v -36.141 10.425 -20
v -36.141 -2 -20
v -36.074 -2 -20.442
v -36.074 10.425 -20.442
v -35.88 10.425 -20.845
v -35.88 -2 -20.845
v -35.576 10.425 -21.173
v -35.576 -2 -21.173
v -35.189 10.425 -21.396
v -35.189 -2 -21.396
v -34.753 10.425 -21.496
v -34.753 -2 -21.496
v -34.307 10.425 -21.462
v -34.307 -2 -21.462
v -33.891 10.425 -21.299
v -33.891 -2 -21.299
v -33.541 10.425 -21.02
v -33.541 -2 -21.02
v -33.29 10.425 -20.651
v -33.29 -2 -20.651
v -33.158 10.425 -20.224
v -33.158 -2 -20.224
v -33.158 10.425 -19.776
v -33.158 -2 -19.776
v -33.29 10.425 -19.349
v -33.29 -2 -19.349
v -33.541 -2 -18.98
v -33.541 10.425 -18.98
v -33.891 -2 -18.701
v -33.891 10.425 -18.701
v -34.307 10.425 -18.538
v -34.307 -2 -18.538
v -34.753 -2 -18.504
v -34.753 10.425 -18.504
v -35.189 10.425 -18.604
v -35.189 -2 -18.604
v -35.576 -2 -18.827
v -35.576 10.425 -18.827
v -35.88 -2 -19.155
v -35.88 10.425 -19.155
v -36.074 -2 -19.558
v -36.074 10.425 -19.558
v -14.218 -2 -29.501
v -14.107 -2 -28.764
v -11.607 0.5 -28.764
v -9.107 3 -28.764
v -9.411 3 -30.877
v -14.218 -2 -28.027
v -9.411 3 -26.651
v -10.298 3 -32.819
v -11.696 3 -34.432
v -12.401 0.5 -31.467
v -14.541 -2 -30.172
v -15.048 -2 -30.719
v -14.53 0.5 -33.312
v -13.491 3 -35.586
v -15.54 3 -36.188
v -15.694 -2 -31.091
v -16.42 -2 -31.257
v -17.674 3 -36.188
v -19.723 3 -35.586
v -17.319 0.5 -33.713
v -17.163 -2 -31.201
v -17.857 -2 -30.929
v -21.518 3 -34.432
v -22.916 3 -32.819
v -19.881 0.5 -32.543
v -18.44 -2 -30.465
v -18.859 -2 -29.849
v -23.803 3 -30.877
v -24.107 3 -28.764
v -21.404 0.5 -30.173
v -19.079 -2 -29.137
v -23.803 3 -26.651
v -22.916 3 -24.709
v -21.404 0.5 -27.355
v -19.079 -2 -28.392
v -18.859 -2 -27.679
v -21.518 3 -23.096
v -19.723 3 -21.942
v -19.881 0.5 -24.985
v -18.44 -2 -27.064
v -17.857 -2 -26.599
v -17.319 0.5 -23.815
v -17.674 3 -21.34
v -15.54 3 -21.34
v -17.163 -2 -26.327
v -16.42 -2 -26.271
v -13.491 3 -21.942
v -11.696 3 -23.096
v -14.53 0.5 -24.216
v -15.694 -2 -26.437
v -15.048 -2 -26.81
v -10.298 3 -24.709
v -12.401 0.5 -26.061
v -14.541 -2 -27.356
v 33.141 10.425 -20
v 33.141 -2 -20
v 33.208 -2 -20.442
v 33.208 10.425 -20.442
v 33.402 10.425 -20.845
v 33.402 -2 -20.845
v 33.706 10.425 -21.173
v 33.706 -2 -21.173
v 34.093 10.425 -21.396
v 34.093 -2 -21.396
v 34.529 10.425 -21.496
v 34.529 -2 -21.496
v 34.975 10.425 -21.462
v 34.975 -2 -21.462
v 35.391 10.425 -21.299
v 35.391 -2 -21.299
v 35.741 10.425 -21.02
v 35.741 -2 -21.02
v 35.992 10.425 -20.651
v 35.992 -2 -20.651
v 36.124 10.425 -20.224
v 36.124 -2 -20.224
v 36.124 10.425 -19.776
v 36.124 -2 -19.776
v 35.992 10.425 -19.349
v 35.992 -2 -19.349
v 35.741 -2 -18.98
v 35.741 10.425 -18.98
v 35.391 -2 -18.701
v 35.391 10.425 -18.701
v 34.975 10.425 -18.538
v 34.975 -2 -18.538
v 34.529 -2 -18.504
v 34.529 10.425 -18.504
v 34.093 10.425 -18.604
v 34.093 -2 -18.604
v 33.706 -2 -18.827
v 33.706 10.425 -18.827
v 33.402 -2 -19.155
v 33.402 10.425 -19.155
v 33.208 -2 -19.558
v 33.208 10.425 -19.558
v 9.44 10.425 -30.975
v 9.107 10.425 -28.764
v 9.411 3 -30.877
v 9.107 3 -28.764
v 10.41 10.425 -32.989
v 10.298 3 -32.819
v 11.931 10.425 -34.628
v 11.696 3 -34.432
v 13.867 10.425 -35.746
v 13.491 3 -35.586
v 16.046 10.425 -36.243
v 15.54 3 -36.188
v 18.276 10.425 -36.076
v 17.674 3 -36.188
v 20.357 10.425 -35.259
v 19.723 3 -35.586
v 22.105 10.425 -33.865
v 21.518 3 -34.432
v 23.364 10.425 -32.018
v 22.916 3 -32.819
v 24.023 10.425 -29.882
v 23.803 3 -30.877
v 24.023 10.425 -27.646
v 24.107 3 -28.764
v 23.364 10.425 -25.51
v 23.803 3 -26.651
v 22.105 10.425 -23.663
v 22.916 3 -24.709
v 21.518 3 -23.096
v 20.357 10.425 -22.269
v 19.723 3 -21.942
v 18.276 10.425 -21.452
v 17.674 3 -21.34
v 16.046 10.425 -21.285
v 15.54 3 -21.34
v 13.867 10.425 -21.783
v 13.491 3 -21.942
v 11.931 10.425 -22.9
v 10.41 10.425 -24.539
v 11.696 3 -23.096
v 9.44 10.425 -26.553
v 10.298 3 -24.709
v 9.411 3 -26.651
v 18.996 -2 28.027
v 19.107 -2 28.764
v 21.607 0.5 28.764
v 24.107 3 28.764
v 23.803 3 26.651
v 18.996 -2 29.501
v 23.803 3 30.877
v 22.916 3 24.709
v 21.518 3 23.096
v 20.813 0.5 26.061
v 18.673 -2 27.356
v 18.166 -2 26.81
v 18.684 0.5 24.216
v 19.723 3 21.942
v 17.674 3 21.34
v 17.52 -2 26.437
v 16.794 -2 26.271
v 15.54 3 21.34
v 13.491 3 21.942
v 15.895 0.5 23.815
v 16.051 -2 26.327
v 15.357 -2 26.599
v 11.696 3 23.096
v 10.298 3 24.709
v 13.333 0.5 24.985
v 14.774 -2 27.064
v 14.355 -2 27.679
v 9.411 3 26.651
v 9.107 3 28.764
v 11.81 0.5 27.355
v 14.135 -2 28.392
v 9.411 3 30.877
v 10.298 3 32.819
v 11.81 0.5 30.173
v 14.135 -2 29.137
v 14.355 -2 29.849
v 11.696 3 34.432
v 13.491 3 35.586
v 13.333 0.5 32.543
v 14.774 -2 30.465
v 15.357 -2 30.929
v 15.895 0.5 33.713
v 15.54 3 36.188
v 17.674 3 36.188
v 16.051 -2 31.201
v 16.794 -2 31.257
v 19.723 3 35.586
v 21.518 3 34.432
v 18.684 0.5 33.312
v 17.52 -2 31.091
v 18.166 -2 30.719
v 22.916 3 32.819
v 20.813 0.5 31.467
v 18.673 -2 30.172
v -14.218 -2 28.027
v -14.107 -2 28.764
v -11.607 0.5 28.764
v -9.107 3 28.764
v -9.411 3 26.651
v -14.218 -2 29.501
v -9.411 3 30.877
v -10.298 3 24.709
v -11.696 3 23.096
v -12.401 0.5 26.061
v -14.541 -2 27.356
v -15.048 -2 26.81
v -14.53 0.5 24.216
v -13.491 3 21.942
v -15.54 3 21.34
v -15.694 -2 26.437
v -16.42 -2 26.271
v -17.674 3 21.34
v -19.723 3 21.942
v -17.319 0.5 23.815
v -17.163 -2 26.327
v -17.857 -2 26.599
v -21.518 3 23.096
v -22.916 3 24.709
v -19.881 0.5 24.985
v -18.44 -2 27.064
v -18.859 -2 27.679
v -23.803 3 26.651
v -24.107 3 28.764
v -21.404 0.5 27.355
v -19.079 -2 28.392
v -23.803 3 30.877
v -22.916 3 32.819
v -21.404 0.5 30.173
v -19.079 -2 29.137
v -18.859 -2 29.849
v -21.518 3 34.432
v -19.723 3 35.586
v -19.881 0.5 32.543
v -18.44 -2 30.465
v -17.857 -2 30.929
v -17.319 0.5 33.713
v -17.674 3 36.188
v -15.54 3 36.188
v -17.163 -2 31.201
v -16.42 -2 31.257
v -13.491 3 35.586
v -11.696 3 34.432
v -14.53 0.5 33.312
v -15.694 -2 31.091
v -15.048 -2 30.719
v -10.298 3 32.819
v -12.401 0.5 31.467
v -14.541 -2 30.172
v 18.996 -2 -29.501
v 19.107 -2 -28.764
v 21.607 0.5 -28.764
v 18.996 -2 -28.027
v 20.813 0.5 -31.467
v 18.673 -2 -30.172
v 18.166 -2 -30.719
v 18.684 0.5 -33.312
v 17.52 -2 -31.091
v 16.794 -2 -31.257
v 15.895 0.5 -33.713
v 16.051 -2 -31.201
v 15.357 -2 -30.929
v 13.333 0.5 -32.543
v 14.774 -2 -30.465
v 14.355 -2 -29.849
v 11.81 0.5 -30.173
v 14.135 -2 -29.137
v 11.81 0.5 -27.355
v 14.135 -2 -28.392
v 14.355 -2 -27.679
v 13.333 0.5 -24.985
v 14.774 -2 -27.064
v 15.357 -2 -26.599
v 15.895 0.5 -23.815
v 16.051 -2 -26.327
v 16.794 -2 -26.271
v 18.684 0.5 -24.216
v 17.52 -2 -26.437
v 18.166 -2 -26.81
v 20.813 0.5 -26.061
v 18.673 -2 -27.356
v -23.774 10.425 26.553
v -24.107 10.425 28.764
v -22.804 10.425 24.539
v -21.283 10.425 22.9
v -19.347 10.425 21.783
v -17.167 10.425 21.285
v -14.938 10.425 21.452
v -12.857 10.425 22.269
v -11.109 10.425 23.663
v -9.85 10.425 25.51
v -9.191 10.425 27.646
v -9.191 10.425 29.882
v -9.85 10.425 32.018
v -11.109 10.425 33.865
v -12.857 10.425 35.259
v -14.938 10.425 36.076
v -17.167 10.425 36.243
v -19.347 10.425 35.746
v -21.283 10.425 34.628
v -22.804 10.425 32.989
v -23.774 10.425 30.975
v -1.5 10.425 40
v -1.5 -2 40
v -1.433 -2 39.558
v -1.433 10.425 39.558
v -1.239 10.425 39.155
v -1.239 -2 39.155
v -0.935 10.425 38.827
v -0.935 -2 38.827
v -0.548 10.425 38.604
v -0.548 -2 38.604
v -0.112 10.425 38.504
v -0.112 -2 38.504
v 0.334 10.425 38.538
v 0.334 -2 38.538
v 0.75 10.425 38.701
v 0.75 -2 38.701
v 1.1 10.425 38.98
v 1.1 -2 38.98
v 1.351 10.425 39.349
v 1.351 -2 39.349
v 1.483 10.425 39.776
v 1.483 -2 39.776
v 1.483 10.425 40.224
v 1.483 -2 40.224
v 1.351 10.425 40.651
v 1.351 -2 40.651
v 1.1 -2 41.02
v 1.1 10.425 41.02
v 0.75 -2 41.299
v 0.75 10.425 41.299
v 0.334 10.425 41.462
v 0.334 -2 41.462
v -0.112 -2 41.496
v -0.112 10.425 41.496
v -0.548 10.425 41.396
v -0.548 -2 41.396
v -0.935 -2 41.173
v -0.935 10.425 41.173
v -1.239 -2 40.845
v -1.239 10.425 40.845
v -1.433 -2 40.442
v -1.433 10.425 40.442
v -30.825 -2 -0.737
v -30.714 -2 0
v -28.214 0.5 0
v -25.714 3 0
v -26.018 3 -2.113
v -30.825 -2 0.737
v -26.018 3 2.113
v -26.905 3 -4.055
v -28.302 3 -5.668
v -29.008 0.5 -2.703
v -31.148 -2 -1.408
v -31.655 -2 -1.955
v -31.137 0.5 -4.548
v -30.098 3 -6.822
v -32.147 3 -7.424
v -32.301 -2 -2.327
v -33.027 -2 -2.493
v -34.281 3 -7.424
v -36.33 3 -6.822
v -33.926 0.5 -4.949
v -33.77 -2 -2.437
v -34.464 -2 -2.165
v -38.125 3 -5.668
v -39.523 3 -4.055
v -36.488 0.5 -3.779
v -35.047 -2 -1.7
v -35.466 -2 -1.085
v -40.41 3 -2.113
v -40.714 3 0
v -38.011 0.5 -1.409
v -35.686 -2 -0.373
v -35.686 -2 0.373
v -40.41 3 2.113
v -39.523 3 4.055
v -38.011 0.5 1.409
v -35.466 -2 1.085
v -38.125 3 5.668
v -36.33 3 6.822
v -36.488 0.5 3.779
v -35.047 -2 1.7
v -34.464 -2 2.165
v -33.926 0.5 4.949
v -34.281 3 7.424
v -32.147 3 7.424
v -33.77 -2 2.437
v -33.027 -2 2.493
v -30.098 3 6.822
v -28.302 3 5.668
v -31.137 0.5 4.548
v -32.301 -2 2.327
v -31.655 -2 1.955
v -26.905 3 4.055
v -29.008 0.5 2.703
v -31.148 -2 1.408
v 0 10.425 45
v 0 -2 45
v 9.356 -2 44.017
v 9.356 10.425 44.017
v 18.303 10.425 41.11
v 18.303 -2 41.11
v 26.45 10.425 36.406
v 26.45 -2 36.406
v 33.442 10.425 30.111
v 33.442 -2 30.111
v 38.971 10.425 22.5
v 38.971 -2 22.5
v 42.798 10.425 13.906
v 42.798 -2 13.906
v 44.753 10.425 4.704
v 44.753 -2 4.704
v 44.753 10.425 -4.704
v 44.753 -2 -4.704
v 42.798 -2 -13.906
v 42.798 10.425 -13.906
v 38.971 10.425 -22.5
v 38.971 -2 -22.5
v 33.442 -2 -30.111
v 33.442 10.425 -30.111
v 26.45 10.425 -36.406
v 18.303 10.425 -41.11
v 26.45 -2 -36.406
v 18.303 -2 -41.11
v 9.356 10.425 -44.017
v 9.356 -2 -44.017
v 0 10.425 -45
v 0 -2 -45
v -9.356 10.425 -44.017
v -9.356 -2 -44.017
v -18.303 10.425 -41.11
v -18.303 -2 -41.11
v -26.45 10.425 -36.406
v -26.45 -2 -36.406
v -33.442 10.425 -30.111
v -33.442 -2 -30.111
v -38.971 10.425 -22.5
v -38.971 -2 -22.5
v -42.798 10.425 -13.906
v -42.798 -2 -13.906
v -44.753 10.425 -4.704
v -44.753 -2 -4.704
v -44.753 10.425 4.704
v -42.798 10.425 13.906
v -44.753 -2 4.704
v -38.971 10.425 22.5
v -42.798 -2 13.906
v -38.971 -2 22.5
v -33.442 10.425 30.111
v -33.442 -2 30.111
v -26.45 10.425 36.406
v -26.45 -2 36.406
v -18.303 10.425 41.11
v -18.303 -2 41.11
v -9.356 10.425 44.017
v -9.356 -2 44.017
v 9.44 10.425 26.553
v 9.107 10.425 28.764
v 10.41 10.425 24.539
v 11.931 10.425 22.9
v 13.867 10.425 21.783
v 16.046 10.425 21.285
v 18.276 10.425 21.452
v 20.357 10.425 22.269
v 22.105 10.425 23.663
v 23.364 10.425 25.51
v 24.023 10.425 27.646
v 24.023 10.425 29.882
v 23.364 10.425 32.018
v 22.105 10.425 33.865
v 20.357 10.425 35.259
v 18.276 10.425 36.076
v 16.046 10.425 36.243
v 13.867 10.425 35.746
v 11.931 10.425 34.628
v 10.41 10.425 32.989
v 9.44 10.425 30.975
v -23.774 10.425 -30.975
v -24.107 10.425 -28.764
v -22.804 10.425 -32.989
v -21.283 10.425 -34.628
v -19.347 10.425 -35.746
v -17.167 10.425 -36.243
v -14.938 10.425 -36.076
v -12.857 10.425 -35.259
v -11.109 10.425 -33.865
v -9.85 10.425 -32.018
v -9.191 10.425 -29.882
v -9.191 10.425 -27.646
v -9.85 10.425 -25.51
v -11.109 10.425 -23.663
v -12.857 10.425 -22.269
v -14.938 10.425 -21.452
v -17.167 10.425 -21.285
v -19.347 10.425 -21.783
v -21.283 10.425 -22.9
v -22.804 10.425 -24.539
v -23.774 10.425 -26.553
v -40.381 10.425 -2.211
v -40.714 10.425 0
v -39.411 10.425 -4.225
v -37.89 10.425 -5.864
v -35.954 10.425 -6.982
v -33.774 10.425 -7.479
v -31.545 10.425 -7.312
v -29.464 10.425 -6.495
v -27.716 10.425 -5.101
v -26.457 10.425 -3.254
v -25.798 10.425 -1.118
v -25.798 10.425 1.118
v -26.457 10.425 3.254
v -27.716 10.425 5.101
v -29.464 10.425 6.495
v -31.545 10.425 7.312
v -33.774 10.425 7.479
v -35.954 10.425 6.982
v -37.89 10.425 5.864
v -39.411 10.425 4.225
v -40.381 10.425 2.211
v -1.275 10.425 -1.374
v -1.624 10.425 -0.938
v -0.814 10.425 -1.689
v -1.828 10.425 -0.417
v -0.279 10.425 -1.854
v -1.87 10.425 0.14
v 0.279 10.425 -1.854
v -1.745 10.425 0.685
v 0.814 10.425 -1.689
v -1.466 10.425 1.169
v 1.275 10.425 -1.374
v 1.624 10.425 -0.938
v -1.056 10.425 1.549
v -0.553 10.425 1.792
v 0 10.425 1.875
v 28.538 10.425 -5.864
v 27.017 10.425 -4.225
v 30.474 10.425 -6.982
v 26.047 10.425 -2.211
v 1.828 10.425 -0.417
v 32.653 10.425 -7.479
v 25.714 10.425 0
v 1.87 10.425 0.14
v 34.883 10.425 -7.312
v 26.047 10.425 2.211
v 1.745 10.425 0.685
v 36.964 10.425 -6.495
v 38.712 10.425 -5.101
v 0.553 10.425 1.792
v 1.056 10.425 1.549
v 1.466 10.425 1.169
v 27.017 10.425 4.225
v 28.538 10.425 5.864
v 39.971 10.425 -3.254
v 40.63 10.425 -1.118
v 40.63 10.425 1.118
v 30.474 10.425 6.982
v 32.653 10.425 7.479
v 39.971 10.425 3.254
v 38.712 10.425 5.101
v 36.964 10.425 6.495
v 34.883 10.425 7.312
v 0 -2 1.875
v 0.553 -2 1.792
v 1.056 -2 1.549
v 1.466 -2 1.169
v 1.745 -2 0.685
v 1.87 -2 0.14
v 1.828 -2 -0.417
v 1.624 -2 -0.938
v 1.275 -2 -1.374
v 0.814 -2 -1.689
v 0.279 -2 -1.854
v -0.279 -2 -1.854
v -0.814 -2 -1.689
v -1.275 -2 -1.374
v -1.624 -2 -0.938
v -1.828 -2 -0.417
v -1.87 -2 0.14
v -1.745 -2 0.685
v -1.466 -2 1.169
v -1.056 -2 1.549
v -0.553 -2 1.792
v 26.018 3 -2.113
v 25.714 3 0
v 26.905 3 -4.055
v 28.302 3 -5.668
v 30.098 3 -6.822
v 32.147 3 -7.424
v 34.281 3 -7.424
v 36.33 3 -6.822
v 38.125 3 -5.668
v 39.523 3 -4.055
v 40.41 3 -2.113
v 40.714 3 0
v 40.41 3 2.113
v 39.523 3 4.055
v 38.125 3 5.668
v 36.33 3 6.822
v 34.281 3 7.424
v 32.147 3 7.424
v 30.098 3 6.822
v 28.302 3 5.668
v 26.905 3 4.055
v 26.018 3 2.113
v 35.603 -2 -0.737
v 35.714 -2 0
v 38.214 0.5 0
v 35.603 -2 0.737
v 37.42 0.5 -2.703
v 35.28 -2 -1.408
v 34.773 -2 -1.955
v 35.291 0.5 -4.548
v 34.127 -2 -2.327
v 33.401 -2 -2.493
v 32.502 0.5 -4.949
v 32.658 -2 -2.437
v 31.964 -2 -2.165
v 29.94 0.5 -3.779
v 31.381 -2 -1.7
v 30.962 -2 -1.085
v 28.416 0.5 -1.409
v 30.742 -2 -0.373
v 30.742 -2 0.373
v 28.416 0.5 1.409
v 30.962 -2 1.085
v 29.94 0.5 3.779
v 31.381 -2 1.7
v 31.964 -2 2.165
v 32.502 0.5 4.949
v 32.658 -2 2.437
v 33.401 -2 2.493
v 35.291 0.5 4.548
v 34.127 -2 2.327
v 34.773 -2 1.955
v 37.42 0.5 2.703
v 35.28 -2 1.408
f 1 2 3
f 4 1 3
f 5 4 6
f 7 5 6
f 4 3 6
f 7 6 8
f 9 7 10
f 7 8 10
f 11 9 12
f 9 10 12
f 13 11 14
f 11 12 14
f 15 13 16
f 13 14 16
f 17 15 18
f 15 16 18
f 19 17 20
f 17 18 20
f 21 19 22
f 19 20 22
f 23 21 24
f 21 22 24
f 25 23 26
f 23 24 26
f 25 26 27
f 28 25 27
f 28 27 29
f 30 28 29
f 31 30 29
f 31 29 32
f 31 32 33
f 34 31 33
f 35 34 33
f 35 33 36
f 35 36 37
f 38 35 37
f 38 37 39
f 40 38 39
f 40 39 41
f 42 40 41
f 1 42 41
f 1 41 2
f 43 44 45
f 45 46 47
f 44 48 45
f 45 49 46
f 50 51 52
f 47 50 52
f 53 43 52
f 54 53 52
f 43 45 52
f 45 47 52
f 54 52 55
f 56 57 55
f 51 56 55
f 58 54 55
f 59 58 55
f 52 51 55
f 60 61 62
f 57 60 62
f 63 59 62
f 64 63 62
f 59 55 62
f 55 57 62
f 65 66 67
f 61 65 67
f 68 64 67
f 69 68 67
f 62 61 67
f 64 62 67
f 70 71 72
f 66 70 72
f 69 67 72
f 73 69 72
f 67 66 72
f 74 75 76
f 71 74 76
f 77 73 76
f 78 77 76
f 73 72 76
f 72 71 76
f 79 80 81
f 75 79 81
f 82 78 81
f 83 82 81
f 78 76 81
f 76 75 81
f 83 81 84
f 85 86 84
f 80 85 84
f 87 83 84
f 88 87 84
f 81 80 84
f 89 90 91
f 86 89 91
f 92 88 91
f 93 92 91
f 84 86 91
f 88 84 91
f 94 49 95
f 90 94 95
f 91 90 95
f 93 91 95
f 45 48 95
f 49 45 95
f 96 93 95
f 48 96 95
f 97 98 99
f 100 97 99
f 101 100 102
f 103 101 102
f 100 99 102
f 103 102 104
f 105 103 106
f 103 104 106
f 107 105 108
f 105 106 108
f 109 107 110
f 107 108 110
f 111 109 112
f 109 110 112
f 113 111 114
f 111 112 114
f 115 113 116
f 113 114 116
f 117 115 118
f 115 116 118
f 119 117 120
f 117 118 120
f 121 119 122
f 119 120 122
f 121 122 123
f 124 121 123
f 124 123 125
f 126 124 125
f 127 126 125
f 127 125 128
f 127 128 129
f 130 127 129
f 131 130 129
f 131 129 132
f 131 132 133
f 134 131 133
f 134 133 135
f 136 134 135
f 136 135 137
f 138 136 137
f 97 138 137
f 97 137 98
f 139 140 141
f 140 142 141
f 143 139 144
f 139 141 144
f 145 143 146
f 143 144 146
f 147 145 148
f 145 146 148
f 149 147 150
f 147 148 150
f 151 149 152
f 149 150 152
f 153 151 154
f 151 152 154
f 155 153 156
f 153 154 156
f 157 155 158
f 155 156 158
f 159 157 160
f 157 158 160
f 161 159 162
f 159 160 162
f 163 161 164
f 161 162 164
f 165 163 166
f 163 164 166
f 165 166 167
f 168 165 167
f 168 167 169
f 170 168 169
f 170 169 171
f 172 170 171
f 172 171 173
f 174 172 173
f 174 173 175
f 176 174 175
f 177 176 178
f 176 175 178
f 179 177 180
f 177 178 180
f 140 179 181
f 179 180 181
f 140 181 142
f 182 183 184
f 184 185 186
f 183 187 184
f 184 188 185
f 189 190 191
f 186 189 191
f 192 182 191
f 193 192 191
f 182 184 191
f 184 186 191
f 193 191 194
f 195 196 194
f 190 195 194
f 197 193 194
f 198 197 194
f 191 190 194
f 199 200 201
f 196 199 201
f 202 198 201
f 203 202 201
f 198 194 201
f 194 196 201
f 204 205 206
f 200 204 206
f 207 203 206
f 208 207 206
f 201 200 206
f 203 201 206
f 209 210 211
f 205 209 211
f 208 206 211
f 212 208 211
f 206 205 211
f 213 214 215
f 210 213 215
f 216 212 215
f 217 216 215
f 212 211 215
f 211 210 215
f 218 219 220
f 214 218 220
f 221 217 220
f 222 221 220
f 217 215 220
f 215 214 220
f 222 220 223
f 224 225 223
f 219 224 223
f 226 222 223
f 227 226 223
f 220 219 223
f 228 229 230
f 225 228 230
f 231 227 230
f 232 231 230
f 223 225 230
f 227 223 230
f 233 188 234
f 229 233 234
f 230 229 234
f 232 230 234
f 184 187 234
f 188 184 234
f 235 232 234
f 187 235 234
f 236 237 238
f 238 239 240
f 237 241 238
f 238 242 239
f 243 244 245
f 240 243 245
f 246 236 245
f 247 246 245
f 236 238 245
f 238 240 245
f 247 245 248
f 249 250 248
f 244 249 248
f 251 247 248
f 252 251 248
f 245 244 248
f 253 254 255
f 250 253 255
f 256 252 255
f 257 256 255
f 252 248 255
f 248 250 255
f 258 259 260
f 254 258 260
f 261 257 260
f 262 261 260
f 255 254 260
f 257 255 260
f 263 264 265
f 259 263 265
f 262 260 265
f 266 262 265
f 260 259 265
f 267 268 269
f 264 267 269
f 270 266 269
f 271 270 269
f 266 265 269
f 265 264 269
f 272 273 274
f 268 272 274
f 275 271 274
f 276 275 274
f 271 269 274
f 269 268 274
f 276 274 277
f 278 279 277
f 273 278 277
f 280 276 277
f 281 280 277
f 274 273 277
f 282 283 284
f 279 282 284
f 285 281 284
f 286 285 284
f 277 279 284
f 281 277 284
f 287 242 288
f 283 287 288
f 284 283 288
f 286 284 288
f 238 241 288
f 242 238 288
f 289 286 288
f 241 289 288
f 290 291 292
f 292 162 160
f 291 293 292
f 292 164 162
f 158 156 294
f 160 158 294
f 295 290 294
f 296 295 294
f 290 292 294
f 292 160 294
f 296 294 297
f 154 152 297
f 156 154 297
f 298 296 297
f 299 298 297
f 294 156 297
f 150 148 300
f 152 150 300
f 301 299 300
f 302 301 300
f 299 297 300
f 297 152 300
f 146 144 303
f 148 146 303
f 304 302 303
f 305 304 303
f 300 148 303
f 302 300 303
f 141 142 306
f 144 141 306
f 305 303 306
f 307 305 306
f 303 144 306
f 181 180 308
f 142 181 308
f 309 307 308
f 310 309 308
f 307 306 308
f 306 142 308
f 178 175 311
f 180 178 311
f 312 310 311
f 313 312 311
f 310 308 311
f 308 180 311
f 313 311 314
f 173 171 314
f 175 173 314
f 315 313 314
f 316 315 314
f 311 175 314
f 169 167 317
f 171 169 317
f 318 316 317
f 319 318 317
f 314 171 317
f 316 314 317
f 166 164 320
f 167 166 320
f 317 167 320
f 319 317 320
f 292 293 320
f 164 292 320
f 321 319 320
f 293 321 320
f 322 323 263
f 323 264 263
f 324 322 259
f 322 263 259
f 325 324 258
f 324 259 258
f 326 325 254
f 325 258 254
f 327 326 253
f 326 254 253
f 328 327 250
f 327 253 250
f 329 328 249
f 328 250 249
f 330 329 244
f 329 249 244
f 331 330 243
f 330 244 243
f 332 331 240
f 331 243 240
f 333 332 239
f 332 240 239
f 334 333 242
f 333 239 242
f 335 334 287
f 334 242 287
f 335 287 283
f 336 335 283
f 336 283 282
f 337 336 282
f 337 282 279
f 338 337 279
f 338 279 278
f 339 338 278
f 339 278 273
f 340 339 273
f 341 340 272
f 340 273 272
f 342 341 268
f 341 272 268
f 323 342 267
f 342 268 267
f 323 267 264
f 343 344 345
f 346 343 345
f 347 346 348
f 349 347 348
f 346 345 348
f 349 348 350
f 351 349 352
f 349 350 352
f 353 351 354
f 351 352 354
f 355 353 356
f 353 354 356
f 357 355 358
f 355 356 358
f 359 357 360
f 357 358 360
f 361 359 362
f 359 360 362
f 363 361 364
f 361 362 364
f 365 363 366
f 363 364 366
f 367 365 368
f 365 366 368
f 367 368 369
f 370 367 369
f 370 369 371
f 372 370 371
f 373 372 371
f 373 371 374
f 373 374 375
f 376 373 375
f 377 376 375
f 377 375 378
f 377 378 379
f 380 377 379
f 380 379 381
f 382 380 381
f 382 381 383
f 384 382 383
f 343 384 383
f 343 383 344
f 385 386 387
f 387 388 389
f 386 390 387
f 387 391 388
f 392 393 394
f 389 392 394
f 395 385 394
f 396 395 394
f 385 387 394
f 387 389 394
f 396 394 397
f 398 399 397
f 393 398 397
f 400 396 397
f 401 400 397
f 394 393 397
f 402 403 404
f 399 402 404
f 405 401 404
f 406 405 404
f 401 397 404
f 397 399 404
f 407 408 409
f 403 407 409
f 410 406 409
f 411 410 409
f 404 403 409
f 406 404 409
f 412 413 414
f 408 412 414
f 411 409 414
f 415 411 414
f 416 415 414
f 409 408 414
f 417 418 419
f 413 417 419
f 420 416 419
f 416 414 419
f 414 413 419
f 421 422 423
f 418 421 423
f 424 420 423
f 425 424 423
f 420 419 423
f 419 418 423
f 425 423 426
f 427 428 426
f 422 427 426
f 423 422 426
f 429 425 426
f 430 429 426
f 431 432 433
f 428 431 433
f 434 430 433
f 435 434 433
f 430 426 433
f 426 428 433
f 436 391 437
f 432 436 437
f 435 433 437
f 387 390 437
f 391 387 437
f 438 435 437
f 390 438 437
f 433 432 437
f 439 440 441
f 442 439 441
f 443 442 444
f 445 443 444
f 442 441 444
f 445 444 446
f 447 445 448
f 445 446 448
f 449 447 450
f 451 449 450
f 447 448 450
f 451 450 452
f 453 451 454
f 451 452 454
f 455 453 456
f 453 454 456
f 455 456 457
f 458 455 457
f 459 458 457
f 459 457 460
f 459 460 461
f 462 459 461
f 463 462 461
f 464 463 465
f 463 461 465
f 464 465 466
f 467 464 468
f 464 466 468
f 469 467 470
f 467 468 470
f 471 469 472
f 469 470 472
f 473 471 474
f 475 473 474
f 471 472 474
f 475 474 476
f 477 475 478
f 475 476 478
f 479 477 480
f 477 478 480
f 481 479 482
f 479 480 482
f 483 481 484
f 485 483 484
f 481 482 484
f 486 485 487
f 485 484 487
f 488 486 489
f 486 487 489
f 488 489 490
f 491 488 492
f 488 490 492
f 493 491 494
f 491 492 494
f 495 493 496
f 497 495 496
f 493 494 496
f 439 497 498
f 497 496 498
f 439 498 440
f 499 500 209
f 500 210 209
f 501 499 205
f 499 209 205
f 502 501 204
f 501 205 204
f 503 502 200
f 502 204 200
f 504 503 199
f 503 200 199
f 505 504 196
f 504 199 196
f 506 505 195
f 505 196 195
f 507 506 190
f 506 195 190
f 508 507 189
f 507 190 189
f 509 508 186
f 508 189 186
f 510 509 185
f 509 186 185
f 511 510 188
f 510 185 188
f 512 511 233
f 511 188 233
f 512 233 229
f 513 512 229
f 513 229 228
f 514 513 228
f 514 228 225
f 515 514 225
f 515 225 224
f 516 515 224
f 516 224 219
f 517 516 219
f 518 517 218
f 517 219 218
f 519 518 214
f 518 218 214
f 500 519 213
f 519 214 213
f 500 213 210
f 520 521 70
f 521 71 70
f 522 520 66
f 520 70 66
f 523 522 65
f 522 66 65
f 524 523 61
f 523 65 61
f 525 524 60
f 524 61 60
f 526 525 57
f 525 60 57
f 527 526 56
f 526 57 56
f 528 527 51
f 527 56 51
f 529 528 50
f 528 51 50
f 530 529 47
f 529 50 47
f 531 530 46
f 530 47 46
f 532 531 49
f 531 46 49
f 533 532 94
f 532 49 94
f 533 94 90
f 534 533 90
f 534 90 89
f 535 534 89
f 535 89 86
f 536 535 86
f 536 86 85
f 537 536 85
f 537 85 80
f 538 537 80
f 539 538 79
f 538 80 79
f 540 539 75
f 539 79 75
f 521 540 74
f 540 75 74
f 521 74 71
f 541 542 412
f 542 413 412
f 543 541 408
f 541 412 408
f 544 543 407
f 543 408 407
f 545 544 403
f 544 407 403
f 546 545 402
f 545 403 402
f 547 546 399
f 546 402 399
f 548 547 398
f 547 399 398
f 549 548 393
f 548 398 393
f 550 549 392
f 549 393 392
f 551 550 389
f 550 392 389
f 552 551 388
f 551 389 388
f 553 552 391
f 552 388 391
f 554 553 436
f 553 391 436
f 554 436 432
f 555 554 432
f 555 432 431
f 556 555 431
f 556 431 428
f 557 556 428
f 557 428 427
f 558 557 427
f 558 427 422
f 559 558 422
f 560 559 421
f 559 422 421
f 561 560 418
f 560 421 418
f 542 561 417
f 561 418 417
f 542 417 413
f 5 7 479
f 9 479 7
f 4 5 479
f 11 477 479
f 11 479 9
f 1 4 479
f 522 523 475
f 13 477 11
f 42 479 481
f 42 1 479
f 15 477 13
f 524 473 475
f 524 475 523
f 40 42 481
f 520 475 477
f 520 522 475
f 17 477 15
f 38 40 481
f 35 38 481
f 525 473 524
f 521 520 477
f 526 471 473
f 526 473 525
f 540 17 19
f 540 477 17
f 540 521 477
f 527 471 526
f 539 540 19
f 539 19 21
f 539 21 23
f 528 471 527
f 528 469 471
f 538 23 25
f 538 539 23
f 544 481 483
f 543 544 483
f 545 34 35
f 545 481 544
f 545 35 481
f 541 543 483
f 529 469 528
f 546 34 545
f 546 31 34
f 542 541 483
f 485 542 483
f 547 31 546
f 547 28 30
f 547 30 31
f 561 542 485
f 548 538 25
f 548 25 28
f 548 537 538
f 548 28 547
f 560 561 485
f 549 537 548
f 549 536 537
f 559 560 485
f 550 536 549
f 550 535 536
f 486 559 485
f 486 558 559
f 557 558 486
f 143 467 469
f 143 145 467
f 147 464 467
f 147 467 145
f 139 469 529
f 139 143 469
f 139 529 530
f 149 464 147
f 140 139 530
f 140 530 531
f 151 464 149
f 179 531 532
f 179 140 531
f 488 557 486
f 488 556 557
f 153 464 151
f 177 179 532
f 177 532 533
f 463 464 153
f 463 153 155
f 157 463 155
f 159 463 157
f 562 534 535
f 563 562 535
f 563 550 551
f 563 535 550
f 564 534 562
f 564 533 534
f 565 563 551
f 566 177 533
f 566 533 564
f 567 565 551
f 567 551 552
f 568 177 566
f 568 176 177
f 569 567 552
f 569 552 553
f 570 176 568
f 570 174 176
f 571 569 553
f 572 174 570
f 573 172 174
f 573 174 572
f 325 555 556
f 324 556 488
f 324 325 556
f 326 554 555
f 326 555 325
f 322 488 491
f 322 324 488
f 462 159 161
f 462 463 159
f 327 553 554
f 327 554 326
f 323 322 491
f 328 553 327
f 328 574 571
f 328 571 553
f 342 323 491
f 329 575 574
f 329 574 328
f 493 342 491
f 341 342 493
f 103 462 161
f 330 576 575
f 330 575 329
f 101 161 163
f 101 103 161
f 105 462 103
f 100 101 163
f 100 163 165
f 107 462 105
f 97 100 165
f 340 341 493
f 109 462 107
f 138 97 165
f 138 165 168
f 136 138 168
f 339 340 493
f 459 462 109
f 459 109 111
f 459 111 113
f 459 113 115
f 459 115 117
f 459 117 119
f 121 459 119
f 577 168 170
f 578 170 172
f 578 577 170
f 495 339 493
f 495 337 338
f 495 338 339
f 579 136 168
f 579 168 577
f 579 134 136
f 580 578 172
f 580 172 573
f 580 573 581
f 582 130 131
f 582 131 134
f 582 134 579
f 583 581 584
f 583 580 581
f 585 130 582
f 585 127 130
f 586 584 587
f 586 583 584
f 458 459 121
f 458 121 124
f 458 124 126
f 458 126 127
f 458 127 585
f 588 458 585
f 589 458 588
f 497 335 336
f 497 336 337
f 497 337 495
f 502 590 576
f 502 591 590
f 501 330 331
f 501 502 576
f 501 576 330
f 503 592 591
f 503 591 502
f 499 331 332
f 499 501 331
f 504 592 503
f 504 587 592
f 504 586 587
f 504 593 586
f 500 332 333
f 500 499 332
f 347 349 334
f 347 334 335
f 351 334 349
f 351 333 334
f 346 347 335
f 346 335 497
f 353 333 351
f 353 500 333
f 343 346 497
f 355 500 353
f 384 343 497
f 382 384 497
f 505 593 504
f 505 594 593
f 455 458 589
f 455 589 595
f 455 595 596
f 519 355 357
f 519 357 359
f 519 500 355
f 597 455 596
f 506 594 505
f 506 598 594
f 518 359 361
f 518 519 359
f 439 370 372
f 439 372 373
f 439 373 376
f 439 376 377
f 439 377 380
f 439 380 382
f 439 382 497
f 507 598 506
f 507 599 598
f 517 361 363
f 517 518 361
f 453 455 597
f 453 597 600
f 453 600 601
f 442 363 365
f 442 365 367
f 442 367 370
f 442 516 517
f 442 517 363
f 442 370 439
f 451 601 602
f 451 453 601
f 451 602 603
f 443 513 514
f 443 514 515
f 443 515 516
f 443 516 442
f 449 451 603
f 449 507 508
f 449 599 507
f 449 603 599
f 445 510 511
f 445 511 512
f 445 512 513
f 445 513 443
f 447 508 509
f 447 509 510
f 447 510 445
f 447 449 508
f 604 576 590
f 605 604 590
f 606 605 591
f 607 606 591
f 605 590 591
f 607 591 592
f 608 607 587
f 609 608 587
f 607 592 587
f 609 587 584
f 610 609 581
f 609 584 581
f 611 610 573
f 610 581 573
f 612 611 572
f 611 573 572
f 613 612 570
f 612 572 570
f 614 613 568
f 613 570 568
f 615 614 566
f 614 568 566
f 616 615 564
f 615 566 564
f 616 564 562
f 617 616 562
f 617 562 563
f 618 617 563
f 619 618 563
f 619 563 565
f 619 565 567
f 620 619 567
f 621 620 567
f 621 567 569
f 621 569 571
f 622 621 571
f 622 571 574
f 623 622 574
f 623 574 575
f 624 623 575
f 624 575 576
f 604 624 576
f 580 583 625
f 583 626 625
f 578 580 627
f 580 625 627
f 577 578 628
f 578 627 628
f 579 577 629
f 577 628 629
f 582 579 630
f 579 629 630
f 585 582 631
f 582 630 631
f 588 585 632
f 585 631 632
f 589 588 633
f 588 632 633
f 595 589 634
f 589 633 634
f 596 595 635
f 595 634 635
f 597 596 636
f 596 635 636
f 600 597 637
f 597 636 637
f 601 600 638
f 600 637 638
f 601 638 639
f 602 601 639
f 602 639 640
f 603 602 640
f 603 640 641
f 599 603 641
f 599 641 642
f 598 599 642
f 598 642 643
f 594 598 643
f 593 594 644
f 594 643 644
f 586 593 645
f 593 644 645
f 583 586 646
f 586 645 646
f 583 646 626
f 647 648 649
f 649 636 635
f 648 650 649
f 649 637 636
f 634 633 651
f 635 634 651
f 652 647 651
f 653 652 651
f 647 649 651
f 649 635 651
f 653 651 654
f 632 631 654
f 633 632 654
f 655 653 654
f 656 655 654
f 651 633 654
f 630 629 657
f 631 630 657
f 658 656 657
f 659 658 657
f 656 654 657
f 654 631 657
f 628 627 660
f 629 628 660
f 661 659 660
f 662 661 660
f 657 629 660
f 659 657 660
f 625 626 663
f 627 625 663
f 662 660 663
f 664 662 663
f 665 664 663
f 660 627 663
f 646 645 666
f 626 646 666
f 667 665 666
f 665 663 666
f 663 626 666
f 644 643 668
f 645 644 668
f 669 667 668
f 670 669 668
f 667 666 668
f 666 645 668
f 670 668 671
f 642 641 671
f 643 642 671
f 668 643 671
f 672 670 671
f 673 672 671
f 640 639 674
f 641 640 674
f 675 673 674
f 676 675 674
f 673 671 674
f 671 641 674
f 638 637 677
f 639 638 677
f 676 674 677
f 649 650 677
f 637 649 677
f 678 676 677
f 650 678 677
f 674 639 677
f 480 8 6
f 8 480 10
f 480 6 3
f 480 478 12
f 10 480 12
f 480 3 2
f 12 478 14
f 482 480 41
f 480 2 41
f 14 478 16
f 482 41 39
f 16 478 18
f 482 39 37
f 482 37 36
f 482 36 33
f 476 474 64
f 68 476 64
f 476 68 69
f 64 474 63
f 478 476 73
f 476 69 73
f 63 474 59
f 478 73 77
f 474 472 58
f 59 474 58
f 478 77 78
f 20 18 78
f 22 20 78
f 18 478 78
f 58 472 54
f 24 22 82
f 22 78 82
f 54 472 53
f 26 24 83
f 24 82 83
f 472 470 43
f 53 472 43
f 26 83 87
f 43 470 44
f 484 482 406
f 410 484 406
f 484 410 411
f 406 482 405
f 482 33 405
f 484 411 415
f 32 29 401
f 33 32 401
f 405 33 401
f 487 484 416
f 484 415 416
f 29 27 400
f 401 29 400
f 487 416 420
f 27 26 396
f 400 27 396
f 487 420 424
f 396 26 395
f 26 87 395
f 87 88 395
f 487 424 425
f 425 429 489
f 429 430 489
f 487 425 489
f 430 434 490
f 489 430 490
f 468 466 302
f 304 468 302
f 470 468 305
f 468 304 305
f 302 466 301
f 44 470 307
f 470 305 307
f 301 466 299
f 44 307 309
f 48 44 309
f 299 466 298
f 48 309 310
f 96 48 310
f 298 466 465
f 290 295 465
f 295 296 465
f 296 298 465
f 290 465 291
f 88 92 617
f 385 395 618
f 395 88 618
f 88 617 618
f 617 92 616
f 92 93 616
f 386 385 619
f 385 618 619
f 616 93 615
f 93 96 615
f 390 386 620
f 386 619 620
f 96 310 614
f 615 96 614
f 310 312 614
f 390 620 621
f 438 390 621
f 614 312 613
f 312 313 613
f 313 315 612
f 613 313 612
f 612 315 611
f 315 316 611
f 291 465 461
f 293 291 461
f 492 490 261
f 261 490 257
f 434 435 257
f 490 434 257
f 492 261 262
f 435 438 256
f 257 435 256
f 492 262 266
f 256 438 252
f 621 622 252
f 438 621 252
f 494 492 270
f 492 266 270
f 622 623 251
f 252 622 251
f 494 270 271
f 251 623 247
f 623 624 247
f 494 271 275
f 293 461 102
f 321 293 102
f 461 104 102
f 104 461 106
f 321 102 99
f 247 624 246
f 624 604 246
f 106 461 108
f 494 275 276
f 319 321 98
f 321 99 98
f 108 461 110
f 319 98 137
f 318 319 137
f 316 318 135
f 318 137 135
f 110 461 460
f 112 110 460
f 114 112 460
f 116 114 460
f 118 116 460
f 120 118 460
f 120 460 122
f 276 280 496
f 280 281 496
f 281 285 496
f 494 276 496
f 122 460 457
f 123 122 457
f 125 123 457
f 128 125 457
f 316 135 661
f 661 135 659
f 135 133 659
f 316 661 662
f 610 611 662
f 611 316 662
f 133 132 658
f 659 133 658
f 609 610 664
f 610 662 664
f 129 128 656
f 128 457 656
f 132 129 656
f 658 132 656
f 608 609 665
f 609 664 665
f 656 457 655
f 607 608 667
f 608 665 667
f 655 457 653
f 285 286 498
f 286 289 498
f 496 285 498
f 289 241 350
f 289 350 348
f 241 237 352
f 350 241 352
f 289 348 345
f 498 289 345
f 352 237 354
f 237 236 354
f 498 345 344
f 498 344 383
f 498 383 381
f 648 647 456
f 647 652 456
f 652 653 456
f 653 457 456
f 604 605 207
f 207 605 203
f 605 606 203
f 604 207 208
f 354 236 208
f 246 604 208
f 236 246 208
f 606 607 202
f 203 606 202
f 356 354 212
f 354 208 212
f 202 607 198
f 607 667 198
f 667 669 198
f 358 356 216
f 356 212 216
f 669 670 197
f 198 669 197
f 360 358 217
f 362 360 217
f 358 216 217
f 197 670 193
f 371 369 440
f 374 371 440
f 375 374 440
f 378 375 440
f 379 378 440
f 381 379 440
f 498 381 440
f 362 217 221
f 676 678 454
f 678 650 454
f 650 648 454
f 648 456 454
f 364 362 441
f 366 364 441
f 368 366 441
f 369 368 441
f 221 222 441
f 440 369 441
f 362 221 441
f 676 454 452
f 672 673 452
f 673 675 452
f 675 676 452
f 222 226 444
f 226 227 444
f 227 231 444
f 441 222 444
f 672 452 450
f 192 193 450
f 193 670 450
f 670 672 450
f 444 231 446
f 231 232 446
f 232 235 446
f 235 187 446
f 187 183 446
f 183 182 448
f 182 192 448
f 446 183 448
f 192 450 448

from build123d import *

# Parameters (mm, degrees)
BOSS_EXTRUDE1_DEPTH       = 10.425440853
BOSS_EXTRUDE1_DEPTH_BACK  = 2
SKETCH1_R                 = 45
F_8_0MM_DOWEL_HOLE1_D     = 15
F_8_0MM_DOWEL_HOLE1_DEPTH = 7.425440853
F_8_0MM_DOWEL_HOLE1_TIP   = 7.5
F_3_0_3_DIAMETER_HOLE1_D  = 3
SKETCH2_R                 = 1.875
CUT_EXTRUDE1_DEPTH        = 15


with BuildPart() as part:
    # Sketch1 → Boss-Extrude1 (new, two sides: drawn at the far end of the back side and taken through both)
    with BuildSketch(Plane(origin=(0, 0, 0), x_dir=(1, 0, 0), z_dir=(0, 1, 0)).offset(-BOSS_EXTRUDE1_DEPTH_BACK)):
        with Locations(Location((0, 0, 0), (0, 0, 270))):
            Circle(SKETCH1_R)
    extrude(amount=BOSS_EXTRUDE1_DEPTH + BOSS_EXTRUDE1_DEPTH_BACK)

    # Ø8.0mm Dowel Hole1
    with Locations(Plane(origin=(0, 10.425440853, 0), x_dir=(1, 0, 0), z_dir=(0, 1, 0))):
        with Locations((-16.606971943, 28.764119165), (-16.606971943, -28.764119165), (33.213943886, 0), (16.606971943, 28.764119165), (16.606971943, -28.764119165), (-33.213943886, 0)):
            Hole(F_8_0MM_DOWEL_HOLE1_D / 2, depth=F_8_0MM_DOWEL_HOLE1_DEPTH)
            with Locations((0, 0, -(F_8_0MM_DOWEL_HOLE1_DEPTH + F_8_0MM_DOWEL_HOLE1_TIP / 2))):  # 90° drill point
                Cone(0, F_8_0MM_DOWEL_HOLE1_D / 2, F_8_0MM_DOWEL_HOLE1_TIP, mode=Mode.SUBTRACT)

    # Ø3.0 (3) Diameter Hole1 (through all)
    with Locations(Plane(origin=(0, 10.425440853, 0), x_dir=(1, 0, 0), z_dir=(0, 1, 0))):
        with Locations((-34.641016151, 20), (0, -40), (34.641016151, 20)):
            Hole(F_3_0_3_DIAMETER_HOLE1_D / 2)

    # Sketch2 → Cut-Extrude1 (cut)
    with BuildSketch(Plane(origin=(0, 10.425440853, 0), x_dir=(1, 0, 0), z_dir=(0, 1, 0))):
        with Locations(Location((0, 0, 0), (0, 0, 270))):
            Circle(SKETCH2_R)
    extrude(amount=-CUT_EXTRUDE1_DEPTH, mode=Mode.SUBTRACT)


solid = part.part
